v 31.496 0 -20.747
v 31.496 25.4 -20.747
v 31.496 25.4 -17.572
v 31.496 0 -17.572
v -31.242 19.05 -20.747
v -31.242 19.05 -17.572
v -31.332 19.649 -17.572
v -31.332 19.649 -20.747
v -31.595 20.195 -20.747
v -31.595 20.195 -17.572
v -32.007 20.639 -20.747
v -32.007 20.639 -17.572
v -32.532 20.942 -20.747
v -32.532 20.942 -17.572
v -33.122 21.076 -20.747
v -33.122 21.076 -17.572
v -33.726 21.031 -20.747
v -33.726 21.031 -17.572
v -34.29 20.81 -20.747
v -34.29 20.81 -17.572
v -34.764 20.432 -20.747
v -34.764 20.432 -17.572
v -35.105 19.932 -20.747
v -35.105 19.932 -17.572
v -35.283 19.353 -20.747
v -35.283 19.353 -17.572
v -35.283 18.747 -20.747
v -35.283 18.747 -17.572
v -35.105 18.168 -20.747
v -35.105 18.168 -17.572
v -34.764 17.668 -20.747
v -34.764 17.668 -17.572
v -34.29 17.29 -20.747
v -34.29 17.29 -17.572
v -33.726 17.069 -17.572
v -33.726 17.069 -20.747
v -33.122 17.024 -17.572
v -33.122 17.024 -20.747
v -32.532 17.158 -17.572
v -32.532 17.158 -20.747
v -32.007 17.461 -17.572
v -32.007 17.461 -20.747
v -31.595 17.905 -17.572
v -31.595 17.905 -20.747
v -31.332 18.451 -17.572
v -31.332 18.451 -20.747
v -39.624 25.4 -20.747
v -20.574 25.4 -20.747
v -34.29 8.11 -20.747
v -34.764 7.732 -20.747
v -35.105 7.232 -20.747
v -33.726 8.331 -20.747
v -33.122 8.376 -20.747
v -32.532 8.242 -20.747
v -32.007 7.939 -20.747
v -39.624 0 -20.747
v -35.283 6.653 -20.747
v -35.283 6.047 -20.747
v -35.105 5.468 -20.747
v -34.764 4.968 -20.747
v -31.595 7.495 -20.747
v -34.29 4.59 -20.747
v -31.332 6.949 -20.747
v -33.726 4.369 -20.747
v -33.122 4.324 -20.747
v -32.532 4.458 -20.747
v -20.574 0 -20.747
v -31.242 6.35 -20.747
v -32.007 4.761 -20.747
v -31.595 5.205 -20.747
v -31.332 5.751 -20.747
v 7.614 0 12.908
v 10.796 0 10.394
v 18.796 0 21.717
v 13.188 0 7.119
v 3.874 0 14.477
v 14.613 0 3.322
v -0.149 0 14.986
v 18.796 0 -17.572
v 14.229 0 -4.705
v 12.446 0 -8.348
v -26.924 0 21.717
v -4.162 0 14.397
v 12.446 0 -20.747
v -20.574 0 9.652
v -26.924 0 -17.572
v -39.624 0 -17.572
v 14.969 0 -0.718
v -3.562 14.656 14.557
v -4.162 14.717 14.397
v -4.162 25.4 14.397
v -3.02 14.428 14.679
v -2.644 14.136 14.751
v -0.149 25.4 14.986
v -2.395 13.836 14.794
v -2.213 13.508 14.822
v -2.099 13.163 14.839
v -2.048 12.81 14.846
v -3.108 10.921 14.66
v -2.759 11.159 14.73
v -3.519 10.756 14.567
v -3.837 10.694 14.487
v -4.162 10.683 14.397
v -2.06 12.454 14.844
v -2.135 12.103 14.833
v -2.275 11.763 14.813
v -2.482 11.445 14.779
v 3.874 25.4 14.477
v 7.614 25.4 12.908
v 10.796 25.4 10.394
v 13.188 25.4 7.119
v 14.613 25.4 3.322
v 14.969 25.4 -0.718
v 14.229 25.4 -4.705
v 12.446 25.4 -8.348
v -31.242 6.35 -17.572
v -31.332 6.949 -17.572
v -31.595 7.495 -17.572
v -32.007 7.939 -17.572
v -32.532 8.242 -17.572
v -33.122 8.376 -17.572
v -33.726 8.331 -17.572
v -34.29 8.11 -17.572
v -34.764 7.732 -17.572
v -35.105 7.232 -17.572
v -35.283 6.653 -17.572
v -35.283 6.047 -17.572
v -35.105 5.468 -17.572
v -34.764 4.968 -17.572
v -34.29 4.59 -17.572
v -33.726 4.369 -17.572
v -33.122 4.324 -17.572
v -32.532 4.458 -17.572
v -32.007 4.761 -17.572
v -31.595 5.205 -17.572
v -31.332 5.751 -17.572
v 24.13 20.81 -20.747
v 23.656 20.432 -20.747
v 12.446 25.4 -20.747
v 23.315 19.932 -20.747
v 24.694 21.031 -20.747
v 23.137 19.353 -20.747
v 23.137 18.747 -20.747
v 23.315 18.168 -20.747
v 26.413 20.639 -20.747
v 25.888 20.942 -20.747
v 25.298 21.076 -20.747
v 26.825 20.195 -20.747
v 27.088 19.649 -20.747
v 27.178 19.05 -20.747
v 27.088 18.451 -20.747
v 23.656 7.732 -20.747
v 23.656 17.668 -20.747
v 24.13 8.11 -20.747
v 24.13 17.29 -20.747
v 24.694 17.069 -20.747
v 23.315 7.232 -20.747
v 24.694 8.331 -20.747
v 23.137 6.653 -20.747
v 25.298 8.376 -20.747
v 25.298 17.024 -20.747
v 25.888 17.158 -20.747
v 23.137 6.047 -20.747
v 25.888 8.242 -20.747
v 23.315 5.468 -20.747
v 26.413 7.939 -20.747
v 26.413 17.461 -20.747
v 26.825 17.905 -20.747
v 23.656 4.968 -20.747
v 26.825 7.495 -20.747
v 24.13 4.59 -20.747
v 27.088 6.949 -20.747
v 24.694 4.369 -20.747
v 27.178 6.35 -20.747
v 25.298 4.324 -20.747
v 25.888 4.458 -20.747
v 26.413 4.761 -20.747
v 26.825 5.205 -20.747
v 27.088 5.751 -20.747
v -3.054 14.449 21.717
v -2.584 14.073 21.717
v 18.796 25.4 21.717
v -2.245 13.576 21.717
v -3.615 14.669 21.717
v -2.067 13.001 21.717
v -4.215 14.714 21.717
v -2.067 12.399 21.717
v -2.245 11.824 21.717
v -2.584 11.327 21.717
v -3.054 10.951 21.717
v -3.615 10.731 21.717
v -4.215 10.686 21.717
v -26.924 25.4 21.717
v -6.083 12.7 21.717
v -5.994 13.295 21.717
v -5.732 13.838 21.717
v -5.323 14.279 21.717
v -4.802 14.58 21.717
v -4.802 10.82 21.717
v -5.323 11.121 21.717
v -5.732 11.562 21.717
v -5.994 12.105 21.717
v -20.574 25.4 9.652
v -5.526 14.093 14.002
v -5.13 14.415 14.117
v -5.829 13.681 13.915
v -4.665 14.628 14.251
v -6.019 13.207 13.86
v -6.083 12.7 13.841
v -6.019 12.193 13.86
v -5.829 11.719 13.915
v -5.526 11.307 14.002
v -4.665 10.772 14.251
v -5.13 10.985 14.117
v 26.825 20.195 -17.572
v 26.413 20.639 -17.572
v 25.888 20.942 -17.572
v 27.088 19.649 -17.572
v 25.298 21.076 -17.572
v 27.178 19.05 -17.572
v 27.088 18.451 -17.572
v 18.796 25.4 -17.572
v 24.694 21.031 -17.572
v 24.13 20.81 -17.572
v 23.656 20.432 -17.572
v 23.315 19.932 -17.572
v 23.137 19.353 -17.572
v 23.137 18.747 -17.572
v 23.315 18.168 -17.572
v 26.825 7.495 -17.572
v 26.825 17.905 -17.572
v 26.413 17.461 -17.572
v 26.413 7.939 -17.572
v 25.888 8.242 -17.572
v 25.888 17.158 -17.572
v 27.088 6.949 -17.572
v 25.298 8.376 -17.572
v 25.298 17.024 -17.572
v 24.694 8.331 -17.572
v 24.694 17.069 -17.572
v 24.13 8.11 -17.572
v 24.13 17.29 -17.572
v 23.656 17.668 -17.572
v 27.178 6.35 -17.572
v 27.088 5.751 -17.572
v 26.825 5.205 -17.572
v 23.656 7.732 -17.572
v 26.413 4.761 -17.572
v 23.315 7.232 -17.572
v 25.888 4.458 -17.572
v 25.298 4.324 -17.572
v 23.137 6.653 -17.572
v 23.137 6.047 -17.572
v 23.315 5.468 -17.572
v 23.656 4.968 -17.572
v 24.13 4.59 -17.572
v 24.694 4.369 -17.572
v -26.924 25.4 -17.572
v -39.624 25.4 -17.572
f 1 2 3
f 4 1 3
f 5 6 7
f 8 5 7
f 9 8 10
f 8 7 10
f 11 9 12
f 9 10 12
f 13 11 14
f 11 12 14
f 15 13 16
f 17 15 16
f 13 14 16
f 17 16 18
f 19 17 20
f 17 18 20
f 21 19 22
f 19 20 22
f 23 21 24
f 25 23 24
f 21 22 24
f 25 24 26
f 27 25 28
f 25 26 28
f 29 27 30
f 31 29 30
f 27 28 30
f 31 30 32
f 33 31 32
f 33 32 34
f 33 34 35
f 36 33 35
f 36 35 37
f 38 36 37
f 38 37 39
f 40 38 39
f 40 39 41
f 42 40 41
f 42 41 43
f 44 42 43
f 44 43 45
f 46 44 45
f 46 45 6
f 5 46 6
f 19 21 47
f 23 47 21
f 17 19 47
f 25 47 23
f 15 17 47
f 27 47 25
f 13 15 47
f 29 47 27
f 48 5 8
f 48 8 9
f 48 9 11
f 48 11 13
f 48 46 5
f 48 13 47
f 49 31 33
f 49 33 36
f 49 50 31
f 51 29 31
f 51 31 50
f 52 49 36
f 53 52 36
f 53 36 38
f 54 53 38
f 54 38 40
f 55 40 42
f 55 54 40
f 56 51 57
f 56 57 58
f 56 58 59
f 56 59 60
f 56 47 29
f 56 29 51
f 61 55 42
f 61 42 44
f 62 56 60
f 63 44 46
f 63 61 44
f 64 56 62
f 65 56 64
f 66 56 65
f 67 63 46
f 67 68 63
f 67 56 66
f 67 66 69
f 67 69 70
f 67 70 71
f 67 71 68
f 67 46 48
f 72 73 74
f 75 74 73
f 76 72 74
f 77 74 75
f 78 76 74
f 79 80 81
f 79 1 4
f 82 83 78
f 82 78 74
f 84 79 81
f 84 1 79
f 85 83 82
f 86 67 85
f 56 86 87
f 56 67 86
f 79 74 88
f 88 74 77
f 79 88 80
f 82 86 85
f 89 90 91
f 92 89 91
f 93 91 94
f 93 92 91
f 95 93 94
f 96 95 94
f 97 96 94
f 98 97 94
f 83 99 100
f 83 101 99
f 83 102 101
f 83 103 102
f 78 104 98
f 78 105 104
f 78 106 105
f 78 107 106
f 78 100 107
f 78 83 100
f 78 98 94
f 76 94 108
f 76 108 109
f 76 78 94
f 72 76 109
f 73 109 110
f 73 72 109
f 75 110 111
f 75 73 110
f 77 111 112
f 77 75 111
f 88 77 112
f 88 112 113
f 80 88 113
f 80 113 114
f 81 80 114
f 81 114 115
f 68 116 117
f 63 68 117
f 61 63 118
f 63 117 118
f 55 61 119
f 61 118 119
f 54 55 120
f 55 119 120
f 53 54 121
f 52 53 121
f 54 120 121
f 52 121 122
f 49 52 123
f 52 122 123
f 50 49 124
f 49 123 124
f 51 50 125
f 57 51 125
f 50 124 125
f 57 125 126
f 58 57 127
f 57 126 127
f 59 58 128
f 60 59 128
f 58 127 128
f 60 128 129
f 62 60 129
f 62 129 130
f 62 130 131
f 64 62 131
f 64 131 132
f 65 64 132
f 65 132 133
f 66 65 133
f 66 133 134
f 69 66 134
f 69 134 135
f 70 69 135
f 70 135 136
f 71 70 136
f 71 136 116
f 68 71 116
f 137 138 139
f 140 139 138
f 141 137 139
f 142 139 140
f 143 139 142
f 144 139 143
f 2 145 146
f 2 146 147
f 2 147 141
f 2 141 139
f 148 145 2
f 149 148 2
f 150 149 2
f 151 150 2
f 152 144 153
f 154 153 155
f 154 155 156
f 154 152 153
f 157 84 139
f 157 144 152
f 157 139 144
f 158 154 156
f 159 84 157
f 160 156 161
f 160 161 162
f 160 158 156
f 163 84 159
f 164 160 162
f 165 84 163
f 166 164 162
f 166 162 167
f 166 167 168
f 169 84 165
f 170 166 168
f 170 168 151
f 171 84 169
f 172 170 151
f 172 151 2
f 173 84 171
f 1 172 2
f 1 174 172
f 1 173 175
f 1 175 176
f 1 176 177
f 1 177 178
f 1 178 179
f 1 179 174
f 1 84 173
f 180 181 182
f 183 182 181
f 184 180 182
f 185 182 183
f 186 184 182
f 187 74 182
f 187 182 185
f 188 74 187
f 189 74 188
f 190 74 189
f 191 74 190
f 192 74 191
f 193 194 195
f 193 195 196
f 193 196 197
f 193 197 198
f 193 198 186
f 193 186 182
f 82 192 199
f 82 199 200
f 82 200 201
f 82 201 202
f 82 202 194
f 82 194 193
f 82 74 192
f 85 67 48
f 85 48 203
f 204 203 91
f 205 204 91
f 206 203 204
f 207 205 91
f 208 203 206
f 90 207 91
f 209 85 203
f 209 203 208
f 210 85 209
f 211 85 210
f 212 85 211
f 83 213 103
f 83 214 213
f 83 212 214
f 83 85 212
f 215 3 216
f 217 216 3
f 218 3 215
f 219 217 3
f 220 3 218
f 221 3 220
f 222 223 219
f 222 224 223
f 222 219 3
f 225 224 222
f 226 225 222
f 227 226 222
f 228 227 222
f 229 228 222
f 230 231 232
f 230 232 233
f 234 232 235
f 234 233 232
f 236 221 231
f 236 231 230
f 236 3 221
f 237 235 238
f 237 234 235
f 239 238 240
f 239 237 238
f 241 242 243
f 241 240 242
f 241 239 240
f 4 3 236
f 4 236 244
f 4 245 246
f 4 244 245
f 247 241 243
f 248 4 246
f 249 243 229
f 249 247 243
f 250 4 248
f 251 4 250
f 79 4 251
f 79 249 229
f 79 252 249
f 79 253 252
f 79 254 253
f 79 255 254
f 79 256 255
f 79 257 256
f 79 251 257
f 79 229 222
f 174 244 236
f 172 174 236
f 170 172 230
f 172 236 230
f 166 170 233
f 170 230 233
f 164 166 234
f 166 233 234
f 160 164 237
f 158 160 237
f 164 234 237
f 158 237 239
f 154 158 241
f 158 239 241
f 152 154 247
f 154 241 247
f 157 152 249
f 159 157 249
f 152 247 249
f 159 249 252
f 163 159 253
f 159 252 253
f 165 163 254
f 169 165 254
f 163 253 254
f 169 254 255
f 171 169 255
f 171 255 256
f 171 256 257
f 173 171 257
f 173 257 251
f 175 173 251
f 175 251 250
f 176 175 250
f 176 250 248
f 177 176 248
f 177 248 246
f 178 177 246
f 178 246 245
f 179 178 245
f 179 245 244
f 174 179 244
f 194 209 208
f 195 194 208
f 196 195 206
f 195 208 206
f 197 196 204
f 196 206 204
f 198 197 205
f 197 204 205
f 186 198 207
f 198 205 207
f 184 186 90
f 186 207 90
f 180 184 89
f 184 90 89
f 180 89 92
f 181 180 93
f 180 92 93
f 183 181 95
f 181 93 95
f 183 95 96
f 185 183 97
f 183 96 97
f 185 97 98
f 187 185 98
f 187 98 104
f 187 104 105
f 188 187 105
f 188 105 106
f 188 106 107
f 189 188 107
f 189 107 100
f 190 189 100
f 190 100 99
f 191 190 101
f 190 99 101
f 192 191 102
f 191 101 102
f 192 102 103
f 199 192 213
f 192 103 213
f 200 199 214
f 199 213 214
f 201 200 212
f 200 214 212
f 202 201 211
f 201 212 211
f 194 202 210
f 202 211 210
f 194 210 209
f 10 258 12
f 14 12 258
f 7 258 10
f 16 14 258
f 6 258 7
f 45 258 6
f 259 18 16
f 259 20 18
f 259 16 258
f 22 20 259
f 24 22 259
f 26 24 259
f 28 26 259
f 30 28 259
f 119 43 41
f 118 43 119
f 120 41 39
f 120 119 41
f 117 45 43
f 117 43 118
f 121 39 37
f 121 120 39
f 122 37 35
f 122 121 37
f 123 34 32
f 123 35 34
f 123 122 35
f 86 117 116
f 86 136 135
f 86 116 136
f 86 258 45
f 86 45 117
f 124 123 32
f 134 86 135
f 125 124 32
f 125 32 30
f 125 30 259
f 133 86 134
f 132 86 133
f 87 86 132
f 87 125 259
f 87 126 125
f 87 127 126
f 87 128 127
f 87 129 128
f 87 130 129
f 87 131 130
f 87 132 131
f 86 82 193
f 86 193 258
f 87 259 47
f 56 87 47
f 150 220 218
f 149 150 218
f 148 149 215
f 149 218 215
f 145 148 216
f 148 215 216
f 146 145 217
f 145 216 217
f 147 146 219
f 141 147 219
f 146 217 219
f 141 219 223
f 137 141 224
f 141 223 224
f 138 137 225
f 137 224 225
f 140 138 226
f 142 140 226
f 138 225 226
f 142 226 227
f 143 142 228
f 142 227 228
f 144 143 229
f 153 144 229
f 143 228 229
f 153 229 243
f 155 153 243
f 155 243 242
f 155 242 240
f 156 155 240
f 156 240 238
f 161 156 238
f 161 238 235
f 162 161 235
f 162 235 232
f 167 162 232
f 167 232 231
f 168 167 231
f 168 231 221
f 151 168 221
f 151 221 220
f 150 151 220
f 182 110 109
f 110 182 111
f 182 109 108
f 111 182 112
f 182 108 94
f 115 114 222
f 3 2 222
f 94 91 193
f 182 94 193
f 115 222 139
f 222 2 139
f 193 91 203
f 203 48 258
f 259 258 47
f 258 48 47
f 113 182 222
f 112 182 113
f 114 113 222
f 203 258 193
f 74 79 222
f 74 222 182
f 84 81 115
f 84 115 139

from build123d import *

# Parameters (mm, degrees)
BOSS_EXTRUDE1_DEPTH    = 25.4
SKETCH2_R              = 2.032
CUT_EXTRUDE1_DEPTH     = 62.309334692
F_10_32_TAPPED_HOLE1_D = 4.0386


with BuildPart() as part:
    # Sketch1 → Boss-Extrude1 (new body)
    with BuildSketch(Plane(origin=(0, 0, 0), x_dir=(1, 0, 0), z_dir=(0, 1, 0))):
        with BuildLine():
            Line((-20.574, -9.652129604), (-4.162019583, -14.39674322))
            ThreePointArc((-4.162019583, -14.39674322), (12.103082443, -8.837647749), (12.446, 8.347796497))
            Line((12.446, 8.347796497), (12.446, 20.746712887))
            Line((12.446, 20.746712887), (31.496, 20.746712887))
            Line((31.496, 20.746712887), (31.496, 17.571712887))
            Line((31.496, 17.571712887), (18.796, 17.571712887))
            Line((18.796, 17.571712887), (18.796, -12.827129604))
            Line((18.796, -12.827129604), (18.796, -21.717129604))
            Line((18.796, -21.717129604), (-26.924, -21.717129604))
            Line((-26.924, -21.717129604), (-26.924, -12.827129604))
            Line((-26.924, -12.827129604), (-26.924, 17.571712887))
            Line((-26.924, 17.571712887), (-39.624, 17.571712887))
            Line((-39.624, 17.571712887), (-39.624, 20.746712887))
            Line((-39.624, 20.746712887), (-20.574, 20.746712887))
            Line((-20.574, 20.746712887), (-20.574, 9.652))
            Line((-20.574, 9.652), (-20.574, -9.652129604))
        make_face()
    extrude(amount=BOSS_EXTRUDE1_DEPTH)

    # Sketch2 → Cut-Extrude1 (cut, through all)
    with BuildSketch(Plane.XY.offset(-17.571712887)):
        with Locations((-33.274, 19.05)):
            Circle(SKETCH2_R)
        with Locations((-33.274, 6.35)):
            Circle(SKETCH2_R)
        with Locations((25.146, 19.05)):
            Circle(SKETCH2_R)
        with Locations((25.146, 6.35)):
            Circle(SKETCH2_R)
    extrude(amount=-CUT_EXTRUDE1_DEPTH, mode=Mode.SUBTRACT)

    # #10-32 Tapped Hole1 (through all)
    with Locations(Plane.XY.offset(21.717129604)):
        with Locations((-4.064, 12.7)):
            Hole(F_10_32_TAPPED_HOLE1_D / 2)


solid = part.part
